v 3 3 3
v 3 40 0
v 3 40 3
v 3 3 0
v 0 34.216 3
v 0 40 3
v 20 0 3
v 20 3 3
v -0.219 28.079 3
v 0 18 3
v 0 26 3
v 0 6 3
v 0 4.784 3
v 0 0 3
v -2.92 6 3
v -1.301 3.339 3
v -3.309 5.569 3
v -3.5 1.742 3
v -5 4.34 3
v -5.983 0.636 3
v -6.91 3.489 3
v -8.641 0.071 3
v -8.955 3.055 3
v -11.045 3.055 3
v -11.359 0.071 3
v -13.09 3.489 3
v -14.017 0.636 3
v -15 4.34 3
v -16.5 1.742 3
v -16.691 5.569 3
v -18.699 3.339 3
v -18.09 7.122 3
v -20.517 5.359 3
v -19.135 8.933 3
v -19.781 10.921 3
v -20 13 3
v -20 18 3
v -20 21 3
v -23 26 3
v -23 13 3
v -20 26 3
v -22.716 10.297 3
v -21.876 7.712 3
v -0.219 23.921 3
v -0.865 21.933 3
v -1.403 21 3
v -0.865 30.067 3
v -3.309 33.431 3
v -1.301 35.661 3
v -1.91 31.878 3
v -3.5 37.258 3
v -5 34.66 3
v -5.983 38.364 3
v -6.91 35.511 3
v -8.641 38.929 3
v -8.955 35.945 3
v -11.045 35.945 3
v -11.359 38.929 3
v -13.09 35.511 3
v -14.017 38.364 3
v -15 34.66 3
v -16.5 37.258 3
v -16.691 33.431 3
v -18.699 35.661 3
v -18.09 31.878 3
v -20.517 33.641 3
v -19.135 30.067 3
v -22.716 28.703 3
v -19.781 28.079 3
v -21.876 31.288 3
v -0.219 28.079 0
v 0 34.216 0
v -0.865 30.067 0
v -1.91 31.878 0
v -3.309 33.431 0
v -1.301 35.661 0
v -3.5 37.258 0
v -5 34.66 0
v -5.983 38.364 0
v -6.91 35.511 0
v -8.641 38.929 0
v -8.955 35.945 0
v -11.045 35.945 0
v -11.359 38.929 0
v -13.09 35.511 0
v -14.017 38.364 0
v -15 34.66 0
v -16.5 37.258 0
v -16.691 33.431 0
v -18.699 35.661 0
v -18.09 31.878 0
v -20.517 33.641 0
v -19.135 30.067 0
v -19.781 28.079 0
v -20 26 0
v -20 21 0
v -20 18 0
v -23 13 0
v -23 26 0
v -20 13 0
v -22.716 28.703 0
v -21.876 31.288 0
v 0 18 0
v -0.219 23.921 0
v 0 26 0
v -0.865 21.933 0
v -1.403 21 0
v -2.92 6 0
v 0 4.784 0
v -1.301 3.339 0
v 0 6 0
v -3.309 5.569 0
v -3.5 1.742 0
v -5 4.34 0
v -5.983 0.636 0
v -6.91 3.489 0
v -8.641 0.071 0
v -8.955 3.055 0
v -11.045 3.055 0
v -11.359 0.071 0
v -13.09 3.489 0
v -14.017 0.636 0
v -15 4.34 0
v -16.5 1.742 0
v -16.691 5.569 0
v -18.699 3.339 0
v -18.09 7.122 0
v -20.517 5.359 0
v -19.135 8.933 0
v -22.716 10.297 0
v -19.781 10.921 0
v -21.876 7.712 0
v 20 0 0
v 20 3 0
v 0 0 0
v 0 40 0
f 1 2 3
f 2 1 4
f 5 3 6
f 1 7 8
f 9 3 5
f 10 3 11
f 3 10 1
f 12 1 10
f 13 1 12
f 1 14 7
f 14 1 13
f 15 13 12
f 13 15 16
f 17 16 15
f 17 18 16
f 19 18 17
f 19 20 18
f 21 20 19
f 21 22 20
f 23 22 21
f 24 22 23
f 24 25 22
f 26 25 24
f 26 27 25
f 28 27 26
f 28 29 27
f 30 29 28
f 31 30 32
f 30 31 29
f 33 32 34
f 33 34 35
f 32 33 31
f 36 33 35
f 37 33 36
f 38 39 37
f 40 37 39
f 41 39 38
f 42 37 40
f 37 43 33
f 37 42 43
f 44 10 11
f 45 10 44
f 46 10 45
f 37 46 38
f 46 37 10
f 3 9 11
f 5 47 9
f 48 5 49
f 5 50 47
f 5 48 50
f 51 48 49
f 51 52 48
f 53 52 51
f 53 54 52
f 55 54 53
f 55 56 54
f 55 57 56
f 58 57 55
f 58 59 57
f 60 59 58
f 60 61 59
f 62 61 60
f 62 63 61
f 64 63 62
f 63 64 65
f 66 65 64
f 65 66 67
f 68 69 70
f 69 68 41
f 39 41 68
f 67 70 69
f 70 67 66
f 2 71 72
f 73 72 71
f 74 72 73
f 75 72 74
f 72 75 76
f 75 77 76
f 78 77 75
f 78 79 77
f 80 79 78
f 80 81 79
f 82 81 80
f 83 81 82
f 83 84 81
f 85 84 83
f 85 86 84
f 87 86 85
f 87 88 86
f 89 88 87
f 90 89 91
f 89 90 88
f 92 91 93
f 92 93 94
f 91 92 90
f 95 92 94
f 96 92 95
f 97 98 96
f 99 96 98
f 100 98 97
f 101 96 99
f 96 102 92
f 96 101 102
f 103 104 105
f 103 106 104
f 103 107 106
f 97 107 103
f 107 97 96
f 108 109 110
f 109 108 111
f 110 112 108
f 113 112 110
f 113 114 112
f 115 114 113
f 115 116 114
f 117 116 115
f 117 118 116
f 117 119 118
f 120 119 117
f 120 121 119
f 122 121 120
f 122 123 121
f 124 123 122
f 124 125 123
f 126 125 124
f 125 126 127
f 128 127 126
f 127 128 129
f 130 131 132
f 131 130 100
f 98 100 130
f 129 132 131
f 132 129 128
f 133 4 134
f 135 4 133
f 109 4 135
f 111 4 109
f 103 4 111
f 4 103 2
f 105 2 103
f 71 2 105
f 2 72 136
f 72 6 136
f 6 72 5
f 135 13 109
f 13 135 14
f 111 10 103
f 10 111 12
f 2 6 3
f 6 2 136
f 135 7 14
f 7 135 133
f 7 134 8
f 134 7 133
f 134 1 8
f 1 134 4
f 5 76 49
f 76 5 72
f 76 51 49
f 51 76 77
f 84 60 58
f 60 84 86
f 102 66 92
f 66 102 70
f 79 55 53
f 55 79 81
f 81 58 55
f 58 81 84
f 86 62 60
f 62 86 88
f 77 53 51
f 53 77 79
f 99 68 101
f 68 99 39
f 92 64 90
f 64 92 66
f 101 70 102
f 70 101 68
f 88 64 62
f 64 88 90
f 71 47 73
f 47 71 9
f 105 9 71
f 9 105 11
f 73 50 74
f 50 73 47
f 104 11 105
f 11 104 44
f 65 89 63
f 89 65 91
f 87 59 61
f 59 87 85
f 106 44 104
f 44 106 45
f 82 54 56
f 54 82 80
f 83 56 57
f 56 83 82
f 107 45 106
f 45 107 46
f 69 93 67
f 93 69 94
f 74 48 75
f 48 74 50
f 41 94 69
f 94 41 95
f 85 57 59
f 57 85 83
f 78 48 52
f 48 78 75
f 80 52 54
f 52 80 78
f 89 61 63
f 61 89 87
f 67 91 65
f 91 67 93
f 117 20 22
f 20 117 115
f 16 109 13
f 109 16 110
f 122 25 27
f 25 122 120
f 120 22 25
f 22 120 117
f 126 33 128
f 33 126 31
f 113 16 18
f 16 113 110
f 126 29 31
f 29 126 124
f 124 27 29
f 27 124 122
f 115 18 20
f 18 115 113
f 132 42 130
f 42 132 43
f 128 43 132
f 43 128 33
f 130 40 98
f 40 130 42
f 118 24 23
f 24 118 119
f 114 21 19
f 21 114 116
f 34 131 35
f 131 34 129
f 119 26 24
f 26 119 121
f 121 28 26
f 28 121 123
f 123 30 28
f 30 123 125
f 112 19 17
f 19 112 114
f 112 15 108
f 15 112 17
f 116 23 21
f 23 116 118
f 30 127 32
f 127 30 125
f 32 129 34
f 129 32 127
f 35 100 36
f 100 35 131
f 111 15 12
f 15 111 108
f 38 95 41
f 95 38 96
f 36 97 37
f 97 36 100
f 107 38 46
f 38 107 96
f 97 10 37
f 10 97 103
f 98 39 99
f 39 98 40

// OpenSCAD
//L
union(){ 
 cube([3,40,3]);
 cube([20,3,3]);
}

//буква e
translate([-50,0,0])
union(){
translate([28,18,0]) cube([22,3,3]);
translate([27,13,0]) cube([3,13,3]);
difference(){
union(){
	
  difference(){
  translate([40,26,0]) cylinder(3,13,13);
  translate([40,26,-1]) cylinder(5,10,10);
  translate([32,12,-1]) cube([16,10,5]);

}

difference(){
  translate([40,13,0]) cylinder(3,13,13);
  translate([40,13,-1]) cylinder(5,10,10);
  translate([32,15,-1]) cube([19,13,5]);
  translate([40,6,-1]) cube(20);
}
}
translate([30,13,-1]) cube([3,13,5]);
translate([40,10,-1]) cube(10);
}
}
